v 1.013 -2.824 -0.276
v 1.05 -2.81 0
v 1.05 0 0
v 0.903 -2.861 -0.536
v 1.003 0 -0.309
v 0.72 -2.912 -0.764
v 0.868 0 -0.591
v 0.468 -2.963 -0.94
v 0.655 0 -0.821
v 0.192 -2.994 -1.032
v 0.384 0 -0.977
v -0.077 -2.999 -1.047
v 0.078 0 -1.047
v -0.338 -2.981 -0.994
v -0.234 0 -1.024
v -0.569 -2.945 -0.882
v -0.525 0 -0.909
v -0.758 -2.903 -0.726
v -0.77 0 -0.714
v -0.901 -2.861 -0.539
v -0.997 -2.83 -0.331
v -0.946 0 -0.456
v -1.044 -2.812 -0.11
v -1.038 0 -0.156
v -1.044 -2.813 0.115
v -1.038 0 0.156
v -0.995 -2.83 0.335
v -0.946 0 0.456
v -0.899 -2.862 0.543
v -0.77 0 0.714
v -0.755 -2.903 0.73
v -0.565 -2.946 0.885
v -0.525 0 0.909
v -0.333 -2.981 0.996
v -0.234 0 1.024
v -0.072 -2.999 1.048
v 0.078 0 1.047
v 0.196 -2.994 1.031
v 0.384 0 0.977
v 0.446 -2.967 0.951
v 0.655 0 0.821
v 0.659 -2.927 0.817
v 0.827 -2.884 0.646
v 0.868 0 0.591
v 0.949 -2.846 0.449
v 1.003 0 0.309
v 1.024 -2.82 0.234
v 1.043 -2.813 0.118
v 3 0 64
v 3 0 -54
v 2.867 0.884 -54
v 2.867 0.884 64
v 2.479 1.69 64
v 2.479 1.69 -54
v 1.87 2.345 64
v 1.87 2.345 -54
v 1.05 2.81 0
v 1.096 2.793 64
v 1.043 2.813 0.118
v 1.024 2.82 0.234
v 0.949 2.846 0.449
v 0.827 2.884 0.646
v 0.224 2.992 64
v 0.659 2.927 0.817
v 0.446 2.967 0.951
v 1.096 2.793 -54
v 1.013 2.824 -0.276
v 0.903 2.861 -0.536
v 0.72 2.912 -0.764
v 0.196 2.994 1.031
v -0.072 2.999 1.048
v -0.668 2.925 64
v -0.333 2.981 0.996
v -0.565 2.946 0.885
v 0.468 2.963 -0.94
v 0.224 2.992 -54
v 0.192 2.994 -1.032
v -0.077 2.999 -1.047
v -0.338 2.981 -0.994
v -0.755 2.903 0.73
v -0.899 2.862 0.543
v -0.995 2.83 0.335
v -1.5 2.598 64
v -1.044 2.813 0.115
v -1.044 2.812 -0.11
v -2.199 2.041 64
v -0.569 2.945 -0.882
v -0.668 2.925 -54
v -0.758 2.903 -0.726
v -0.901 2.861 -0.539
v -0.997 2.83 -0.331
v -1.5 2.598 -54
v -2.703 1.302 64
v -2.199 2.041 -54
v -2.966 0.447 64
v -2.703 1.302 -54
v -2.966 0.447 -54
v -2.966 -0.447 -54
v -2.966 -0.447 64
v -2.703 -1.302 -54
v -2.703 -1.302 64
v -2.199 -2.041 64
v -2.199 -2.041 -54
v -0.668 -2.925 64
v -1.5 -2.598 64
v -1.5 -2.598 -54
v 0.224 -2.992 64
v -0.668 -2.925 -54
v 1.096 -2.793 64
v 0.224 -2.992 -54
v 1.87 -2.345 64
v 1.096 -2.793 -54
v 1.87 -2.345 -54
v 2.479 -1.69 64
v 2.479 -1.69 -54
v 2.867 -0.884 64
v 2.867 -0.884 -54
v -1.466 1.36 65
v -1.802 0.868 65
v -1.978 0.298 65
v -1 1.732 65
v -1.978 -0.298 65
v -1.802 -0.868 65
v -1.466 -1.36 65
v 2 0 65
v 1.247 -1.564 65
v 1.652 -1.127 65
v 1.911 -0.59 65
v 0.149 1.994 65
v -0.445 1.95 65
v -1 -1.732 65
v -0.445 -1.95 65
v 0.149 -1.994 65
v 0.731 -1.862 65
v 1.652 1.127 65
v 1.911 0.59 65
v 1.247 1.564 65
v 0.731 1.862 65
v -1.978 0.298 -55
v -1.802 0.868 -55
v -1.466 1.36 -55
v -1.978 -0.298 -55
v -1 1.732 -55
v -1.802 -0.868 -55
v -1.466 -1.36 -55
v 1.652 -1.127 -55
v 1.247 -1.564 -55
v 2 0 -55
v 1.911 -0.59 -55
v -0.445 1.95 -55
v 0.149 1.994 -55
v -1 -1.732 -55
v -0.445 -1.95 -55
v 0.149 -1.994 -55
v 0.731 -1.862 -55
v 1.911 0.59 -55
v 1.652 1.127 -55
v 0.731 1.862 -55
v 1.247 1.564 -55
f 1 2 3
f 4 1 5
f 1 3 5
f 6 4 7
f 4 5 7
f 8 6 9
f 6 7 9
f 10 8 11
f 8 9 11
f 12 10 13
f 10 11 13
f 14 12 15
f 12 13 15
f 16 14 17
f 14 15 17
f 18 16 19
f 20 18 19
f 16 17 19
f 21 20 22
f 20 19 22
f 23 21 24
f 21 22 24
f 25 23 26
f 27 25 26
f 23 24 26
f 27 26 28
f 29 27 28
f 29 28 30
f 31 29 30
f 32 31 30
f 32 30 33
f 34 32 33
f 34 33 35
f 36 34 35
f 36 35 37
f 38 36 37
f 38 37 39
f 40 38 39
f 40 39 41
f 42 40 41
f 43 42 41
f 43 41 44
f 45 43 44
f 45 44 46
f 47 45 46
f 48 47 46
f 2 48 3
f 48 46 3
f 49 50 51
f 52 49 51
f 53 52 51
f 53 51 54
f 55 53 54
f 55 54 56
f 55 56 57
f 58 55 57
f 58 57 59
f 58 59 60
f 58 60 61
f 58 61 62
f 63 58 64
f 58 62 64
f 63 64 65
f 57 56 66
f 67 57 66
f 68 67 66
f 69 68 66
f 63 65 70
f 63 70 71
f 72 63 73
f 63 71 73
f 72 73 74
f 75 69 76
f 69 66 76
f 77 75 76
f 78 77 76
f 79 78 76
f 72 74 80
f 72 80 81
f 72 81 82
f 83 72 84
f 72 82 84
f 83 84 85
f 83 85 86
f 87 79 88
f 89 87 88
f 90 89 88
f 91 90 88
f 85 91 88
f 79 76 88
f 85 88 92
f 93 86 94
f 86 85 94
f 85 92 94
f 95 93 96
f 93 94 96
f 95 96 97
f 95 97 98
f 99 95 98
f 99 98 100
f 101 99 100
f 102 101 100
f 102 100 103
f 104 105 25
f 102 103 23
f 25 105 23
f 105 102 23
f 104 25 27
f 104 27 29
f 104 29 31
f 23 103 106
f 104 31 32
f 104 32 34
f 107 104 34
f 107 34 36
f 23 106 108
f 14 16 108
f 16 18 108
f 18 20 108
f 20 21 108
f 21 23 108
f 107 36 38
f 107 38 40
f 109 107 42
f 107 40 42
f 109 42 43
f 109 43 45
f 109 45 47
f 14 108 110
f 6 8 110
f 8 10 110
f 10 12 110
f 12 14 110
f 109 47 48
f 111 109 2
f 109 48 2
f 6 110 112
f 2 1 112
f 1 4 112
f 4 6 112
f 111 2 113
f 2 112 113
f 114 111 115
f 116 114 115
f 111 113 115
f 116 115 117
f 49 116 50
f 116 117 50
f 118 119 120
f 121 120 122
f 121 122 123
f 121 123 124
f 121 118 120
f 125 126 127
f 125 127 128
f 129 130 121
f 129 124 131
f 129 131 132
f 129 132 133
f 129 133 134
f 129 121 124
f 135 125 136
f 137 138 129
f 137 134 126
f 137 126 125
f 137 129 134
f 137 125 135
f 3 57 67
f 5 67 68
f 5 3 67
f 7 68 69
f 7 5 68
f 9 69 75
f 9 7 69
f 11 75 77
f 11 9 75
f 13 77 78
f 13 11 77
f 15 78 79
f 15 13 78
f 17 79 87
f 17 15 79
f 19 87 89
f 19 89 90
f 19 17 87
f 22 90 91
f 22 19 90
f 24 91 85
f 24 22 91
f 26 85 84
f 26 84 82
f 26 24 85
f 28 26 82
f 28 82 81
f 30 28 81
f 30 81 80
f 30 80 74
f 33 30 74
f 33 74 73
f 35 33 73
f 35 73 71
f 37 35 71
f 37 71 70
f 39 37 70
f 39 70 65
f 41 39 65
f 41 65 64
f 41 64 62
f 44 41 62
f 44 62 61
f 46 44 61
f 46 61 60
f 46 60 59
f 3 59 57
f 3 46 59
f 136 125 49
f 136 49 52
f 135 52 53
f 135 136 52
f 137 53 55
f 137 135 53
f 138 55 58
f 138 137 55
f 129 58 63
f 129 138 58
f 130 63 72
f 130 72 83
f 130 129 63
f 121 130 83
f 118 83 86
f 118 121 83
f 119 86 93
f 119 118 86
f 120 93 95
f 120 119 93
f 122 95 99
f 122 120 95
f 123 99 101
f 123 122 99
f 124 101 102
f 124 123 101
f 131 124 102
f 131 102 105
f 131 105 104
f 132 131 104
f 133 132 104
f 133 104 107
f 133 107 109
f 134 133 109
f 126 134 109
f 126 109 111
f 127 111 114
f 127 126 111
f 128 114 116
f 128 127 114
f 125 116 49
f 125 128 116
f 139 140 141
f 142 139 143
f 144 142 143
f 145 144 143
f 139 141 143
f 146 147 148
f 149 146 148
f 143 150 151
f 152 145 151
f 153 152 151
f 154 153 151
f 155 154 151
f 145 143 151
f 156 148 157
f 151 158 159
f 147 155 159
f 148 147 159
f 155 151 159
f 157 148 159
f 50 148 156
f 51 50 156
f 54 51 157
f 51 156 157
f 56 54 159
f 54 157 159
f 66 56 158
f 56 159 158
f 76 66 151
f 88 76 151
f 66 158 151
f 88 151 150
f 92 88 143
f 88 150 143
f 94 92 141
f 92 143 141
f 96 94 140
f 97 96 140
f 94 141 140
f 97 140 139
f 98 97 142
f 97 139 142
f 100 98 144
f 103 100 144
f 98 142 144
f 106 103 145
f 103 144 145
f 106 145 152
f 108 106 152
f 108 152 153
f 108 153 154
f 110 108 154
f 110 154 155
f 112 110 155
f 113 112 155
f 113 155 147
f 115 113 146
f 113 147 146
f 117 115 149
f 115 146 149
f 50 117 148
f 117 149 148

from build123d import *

# Parameters (mm, degrees)
SZKIC1_R                        = 3
DODANIE_WYCI_GNI_CIE1_DEPTH     = 65
DODANIE_WYCI_GNI_CIE2_START     = 65
SZKIC1_2_R                      = 3
DODANIE_WYCI_GNI_CIE2_DEPTH     = 120
SFAZOWANIE1_SIZE                = 1
SZKIC2_R                        = 1.05
WYTNIJ_WYCI_GNI_CIE1_DEPTH      = 4
WYTNIJ_WYCI_GNI_CIE1_DEPTH_BACK = 4


with BuildPart() as part:
    # Szkic1 → Dodanie-wyci_gni_cie1 (new body)
    with BuildSketch(Plane.XY):
        Circle(SZKIC1_R)
    extrude(amount=DODANIE_WYCI_GNI_CIE1_DEPTH)

    # Szkic1_2 → Dodanie-wyci_gni_cie2 (add)
    with BuildSketch(Plane.XY.offset(DODANIE_WYCI_GNI_CIE2_START)):
        Circle(SZKIC1_2_R)
    extrude(amount=-DODANIE_WYCI_GNI_CIE2_DEPTH)

    # Sfazowanie1
    sfazowanie1_edges = [part.edges().sort_by_distance(p)[0] for p in [
        (-3, 0, 65),
        (-3, 0, -55),
    ]]
    chamfer(sfazowanie1_edges, length=SFAZOWANIE1_SIZE)

    # Szkic2 → Wytnij-wyci_gni_cie1 (cut, two sides)
    with BuildSketch(Plane(origin=(0, 0, 0), x_dir=(1, 0, 0), z_dir=(0, 1, 0))) as wytnij_wyci_gni_cie1_sk:
        Circle(SZKIC2_R)
    extrude(amount=WYTNIJ_WYCI_GNI_CIE1_DEPTH, mode=Mode.SUBTRACT)
    extrude(wytnij_wyci_gni_cie1_sk.sketch, amount=-WYTNIJ_WYCI_GNI_CIE1_DEPTH_BACK, mode=Mode.SUBTRACT)


solid = part.part
